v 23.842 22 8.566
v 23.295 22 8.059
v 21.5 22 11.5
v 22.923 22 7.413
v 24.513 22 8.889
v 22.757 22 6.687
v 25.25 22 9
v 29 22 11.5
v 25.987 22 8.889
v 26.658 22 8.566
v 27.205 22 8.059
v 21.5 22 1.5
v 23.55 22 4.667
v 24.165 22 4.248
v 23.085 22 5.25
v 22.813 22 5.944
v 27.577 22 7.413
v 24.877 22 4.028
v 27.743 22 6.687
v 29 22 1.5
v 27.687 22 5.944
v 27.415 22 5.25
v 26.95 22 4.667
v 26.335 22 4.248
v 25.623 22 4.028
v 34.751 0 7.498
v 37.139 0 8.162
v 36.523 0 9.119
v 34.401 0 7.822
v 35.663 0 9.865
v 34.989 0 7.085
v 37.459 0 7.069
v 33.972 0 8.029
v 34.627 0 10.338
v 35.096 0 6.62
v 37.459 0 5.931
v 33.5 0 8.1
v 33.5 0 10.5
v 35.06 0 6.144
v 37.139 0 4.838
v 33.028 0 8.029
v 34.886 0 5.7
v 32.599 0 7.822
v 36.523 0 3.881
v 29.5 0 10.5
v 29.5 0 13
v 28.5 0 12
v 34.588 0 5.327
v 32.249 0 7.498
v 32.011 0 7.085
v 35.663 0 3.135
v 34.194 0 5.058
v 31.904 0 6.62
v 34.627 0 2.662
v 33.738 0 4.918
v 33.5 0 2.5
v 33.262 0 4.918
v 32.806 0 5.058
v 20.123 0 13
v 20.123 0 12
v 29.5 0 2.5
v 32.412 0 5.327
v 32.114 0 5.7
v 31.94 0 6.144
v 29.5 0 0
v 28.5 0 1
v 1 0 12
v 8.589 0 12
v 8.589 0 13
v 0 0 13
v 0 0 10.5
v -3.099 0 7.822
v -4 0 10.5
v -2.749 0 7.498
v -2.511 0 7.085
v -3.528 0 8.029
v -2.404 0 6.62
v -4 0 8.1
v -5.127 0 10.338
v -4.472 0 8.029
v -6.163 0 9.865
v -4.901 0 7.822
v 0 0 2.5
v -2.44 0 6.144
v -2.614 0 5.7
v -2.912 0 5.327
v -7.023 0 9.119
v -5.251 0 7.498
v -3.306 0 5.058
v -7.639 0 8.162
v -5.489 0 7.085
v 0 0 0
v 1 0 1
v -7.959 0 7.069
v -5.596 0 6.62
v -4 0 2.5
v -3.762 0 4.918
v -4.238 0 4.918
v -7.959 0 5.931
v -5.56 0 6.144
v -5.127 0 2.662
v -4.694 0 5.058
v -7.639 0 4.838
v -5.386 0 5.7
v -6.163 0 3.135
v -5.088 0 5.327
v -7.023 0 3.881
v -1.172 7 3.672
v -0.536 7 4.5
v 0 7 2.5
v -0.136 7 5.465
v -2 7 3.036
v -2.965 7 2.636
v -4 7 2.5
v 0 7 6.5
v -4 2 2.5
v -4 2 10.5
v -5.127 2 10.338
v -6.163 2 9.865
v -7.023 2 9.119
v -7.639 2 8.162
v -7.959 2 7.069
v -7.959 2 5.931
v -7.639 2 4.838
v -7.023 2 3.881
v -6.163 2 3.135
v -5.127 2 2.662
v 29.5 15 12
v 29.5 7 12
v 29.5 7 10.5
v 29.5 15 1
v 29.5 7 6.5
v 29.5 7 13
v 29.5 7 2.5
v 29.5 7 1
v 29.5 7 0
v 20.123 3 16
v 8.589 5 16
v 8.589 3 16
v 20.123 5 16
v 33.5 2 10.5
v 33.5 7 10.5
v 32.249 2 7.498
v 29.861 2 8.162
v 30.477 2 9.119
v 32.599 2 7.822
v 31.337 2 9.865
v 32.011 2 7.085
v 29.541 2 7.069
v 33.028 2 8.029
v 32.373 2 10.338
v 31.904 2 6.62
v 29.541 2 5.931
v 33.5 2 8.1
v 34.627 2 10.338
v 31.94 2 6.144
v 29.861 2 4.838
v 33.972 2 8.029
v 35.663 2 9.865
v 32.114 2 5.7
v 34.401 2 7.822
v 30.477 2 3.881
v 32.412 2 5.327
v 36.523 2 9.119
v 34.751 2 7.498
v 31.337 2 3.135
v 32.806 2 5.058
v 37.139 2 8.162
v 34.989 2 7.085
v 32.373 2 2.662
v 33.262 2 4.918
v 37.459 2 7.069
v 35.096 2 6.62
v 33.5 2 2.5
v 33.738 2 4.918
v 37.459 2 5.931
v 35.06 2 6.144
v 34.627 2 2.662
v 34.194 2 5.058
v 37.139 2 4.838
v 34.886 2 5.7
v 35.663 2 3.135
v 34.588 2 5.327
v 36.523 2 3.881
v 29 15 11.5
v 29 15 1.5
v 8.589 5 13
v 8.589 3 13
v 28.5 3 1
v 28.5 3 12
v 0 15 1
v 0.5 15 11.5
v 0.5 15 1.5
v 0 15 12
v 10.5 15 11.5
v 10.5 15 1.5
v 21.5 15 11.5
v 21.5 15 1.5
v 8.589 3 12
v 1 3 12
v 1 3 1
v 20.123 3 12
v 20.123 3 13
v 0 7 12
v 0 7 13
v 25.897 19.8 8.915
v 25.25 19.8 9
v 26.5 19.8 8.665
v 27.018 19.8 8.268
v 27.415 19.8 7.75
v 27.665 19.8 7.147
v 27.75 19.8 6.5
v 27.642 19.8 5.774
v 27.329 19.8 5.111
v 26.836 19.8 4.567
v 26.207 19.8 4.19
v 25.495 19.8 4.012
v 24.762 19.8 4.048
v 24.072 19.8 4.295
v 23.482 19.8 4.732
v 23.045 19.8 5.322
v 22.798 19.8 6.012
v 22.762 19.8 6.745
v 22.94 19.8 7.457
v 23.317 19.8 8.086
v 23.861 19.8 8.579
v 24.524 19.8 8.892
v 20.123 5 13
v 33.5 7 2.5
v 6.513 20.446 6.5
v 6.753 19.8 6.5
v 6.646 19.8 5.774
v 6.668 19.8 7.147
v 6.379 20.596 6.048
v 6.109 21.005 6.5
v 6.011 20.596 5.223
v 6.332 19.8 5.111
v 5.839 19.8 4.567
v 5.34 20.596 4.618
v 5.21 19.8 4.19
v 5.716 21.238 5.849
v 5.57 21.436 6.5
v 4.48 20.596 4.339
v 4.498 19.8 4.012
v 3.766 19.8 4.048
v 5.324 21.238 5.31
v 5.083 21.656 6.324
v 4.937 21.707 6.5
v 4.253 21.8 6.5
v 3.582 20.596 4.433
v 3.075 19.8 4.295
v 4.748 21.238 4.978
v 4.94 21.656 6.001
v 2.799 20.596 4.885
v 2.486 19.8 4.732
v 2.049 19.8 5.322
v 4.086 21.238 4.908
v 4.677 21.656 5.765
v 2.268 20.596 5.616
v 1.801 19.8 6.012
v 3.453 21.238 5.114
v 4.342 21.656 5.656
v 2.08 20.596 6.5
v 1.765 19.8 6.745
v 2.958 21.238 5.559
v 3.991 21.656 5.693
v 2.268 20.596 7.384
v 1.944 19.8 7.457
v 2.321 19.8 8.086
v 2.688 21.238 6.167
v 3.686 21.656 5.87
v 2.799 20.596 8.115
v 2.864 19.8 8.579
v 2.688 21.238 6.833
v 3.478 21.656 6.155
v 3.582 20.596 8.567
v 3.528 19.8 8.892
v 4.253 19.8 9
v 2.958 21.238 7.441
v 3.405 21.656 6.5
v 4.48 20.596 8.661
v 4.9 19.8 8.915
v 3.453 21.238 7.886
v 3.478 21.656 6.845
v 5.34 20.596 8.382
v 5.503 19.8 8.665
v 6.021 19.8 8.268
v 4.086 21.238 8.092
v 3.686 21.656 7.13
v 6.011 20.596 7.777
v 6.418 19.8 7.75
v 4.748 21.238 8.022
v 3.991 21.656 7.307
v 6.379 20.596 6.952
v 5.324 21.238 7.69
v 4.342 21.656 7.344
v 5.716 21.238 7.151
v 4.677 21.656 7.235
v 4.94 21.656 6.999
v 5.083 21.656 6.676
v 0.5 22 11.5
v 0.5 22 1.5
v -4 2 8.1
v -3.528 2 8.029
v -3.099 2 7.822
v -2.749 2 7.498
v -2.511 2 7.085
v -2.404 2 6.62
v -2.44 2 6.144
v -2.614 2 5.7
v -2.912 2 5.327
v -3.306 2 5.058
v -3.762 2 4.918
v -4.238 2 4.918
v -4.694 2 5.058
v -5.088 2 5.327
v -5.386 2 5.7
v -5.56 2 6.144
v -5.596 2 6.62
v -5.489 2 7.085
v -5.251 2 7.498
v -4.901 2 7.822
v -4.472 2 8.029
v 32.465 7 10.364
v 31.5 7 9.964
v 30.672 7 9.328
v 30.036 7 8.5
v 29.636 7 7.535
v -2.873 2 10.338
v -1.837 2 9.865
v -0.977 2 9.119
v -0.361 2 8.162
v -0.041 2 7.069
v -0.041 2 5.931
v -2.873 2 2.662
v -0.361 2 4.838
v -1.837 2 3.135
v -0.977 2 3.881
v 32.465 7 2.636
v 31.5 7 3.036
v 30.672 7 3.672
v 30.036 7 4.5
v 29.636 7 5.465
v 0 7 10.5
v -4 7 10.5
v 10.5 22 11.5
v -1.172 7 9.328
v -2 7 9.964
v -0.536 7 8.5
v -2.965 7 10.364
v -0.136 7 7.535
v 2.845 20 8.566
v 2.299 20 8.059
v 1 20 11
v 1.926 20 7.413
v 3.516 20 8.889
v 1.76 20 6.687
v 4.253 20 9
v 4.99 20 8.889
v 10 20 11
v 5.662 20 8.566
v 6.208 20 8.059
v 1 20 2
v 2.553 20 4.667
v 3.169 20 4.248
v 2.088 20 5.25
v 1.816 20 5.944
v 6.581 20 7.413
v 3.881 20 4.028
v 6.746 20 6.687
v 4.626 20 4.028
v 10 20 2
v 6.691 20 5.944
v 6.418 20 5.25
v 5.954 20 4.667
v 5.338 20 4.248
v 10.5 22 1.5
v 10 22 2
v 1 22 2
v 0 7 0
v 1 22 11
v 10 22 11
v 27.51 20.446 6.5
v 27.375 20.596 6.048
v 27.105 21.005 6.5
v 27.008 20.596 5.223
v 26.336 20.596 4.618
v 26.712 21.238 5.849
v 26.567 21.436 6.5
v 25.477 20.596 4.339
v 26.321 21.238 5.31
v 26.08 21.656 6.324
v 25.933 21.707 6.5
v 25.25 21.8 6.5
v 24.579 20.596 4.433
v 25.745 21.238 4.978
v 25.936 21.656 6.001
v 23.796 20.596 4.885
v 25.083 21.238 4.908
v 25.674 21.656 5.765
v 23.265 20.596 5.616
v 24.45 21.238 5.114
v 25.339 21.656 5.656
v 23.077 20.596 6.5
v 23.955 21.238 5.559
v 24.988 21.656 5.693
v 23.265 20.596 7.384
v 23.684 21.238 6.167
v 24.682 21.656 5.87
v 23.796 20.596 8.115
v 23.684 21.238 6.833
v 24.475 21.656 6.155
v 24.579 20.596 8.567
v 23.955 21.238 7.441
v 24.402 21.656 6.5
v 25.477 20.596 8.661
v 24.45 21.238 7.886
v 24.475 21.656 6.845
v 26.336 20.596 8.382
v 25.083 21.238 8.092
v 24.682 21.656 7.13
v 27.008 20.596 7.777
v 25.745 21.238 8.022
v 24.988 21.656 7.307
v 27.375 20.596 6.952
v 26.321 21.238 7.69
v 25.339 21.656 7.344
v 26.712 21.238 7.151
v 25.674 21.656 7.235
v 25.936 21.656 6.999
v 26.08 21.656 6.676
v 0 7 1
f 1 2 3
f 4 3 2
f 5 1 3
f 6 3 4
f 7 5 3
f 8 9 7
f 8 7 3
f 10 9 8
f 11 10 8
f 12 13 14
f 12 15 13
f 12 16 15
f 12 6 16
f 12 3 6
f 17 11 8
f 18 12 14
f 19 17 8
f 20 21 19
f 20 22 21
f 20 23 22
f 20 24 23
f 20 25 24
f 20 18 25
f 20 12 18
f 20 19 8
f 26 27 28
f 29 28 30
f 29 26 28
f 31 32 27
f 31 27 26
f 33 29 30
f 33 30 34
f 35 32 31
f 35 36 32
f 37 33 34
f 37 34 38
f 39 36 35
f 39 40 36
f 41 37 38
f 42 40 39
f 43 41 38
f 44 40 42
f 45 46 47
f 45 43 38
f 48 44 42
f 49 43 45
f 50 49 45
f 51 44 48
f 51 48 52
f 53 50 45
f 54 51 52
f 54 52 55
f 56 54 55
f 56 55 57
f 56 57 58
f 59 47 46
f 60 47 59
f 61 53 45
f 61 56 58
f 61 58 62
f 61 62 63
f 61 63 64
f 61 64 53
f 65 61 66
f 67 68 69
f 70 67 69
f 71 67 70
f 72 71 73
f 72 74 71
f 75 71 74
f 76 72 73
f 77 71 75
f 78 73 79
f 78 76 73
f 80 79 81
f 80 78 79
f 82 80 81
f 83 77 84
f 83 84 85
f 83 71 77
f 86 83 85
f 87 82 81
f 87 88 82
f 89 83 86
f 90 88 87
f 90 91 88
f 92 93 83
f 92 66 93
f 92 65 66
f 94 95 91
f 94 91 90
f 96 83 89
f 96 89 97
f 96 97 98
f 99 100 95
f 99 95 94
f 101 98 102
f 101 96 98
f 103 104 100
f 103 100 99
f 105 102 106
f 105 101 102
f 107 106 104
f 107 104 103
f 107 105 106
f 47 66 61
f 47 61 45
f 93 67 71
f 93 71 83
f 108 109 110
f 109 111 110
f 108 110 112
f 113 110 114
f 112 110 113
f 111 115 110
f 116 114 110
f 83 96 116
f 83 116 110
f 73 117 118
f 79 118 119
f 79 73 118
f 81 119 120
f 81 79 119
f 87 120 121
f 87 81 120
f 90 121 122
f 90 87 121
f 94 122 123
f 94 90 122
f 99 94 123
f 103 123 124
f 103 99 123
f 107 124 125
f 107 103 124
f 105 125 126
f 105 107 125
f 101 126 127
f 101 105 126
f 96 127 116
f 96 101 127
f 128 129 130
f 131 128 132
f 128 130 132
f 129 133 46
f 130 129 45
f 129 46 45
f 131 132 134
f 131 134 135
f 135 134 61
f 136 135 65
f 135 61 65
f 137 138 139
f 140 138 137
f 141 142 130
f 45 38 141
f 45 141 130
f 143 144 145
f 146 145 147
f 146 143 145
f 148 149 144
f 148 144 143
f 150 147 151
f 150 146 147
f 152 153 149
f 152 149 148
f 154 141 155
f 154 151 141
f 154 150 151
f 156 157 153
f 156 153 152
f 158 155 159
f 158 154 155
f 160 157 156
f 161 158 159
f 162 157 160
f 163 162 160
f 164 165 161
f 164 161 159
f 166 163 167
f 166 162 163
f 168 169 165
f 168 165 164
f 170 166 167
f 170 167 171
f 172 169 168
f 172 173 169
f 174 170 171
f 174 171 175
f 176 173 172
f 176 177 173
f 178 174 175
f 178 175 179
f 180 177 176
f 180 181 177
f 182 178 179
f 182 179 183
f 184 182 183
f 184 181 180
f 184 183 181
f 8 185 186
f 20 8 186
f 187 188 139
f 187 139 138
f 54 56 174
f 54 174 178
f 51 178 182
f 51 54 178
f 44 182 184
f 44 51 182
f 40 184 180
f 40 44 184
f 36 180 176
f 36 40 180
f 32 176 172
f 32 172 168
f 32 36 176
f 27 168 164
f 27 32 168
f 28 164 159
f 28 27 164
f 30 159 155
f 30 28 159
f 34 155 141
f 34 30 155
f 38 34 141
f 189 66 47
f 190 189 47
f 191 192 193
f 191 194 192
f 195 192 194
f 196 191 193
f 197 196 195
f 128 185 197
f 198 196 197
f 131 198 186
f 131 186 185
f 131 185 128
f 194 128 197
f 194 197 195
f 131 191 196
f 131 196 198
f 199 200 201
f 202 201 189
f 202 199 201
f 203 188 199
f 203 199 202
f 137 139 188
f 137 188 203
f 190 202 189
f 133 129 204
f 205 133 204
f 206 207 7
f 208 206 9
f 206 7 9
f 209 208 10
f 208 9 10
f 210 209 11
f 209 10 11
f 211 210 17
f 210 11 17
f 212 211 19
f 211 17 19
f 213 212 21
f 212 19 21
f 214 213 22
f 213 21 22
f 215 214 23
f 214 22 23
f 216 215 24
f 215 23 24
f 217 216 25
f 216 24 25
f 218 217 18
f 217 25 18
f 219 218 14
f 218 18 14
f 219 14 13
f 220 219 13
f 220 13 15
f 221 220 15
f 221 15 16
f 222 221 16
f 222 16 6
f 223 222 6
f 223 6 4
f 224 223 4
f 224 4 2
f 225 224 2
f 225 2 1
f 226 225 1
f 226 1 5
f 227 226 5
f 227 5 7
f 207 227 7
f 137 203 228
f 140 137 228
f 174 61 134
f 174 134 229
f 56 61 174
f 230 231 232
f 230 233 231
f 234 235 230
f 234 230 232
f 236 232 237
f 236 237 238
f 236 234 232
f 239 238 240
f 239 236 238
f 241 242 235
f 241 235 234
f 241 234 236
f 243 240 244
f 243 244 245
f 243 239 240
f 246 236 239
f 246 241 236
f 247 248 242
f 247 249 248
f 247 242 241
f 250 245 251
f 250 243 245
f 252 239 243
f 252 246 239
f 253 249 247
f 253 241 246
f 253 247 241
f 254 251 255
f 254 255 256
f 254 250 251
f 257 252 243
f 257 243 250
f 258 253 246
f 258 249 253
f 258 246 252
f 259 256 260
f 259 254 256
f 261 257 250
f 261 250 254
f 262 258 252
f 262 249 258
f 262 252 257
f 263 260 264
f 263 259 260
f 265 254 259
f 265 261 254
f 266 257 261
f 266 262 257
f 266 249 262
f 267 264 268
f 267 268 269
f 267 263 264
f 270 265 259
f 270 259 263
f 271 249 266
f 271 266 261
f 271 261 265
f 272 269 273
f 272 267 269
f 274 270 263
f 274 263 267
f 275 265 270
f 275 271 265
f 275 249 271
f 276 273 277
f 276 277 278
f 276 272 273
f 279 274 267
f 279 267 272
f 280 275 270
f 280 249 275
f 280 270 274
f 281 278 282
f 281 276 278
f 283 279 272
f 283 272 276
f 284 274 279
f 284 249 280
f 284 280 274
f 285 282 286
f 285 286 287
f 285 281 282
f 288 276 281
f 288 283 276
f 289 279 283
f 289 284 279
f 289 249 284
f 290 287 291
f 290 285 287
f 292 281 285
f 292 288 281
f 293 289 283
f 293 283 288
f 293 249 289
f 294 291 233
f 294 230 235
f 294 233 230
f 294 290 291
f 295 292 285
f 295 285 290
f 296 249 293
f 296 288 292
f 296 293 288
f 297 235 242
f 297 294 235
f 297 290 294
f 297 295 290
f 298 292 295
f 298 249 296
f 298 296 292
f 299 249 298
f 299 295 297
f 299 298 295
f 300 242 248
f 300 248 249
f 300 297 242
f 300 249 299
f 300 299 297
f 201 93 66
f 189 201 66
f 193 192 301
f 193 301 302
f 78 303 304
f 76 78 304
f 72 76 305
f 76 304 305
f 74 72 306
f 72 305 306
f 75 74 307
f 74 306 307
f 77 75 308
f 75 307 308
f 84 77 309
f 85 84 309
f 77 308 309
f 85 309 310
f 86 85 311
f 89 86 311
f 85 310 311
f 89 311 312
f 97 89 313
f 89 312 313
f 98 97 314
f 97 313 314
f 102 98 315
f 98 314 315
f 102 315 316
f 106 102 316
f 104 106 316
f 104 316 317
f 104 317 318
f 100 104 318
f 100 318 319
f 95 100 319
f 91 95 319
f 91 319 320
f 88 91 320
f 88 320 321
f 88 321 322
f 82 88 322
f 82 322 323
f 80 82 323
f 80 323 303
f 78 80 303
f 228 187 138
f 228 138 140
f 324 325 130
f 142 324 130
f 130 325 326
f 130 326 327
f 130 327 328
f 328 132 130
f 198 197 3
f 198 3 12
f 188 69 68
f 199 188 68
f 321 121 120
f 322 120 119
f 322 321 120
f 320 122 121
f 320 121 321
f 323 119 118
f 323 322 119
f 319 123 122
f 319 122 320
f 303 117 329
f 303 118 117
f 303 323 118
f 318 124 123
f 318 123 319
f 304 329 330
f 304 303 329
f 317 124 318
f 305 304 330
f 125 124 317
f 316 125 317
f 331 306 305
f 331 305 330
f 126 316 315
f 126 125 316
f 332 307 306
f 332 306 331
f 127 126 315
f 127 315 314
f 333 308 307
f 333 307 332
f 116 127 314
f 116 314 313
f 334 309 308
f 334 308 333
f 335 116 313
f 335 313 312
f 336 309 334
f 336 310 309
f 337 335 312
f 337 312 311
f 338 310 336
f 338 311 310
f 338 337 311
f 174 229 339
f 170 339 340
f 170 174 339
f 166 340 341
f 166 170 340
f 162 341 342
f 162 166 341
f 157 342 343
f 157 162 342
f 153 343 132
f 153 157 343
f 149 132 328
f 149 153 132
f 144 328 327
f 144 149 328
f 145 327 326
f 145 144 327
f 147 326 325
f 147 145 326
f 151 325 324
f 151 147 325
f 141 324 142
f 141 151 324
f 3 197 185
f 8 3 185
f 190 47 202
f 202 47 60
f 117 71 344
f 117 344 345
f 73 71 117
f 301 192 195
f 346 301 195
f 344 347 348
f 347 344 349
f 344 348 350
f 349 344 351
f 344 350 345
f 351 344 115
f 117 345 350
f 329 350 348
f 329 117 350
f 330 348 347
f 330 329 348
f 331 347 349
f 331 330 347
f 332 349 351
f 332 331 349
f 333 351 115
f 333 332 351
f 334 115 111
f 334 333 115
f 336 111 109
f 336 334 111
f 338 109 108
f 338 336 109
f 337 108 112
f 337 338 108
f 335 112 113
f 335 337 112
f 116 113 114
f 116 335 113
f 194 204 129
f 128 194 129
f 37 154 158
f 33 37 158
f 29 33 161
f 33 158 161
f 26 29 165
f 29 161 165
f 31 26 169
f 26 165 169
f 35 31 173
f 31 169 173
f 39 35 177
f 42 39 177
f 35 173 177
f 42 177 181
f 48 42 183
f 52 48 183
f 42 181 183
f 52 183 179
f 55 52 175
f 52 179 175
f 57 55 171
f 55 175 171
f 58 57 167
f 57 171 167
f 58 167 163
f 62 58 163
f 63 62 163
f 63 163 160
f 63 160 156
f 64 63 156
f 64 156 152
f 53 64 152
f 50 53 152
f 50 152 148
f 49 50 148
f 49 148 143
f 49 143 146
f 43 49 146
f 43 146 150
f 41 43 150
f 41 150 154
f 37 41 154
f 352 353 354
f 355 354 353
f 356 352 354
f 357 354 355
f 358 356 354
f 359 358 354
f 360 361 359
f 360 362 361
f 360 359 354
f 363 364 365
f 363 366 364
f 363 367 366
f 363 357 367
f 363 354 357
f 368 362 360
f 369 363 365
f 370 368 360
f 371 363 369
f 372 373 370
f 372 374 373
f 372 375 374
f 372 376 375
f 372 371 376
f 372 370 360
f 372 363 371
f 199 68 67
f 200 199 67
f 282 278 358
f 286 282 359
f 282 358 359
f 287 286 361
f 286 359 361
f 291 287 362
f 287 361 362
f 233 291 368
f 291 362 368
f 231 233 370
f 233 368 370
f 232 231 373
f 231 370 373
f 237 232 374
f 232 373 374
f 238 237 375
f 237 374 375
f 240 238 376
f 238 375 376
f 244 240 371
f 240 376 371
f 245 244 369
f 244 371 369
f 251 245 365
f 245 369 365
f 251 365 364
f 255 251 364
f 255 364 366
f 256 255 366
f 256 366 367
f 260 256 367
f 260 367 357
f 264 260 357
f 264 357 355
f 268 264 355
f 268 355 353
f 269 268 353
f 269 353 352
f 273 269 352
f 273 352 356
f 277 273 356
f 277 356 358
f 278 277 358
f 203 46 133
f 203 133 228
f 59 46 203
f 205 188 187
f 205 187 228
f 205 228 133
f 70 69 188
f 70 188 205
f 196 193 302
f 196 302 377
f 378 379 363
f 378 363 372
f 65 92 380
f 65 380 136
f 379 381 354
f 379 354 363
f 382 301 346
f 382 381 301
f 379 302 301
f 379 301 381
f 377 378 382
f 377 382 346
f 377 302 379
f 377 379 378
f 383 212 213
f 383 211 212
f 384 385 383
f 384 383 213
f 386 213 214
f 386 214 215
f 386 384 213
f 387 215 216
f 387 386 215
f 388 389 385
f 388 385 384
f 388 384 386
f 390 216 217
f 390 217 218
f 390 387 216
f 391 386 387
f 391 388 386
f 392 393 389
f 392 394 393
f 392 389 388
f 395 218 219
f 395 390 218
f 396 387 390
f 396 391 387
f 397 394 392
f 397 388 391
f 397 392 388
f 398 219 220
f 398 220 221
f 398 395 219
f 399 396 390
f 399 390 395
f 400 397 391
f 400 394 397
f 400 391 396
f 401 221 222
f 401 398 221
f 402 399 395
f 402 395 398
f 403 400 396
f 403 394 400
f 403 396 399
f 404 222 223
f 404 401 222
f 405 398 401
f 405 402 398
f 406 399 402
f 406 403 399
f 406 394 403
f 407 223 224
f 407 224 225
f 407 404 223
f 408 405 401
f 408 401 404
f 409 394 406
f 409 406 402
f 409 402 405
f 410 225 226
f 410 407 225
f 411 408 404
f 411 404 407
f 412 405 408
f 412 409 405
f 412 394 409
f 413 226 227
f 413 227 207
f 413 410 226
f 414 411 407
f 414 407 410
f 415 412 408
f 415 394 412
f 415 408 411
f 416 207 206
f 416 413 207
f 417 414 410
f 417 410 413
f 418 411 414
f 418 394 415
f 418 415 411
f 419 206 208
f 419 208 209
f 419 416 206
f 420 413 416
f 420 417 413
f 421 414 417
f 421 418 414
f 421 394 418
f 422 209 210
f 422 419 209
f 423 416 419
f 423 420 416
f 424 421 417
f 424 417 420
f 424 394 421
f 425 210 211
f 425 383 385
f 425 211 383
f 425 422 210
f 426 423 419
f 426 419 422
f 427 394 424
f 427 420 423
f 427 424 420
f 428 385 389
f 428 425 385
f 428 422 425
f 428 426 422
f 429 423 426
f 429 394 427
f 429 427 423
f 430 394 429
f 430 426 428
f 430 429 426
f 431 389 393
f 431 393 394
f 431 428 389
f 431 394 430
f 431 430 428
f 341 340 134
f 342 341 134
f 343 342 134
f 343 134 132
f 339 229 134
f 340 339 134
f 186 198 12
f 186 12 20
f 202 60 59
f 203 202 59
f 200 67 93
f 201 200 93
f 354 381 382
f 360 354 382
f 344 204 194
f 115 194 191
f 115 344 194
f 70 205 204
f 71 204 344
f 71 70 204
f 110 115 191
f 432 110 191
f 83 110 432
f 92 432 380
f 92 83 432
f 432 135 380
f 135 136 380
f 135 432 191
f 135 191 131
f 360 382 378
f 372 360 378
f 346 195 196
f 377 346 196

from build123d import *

# Parameters (mm, degrees)
EXTRUDE_1_DEPTH     = 7
CUT_EXTRUDE_START   = -5
SKETCH_2_R          = 4
CUT_EXTRUDE_1_DEPTH = 5
SKETCH_3_W          = 29.5
SKETCH_3_H          = 11
EXTRUDE_2_DEPTH     = 8
SKETCH_4_W          = 7.5
SKETCH_4_H          = 10
SKETCH_4_W_2        = 10
EXTRUDE_3_DEPTH     = 7
SKETCH_5_W          = 9
SKETCH_5_H          = 9
CUT_EXTRUDE_2_DEPTH = 2
SKETCH_6_R          = 2.5
CUT_EXTRUDE_3_DEPTH = 2.2
SKETCH_7_R          = 1.6
CUT_EXTRUDE_4_DEPTH = 45.443784717
SKETCH_8_W          = 11.533749137
SKETCH_8_H          = 5
EXTRUDE_4_DEPTH     = 3
CUT_EXTRUDE_5_DEPTH = 3


# Read off the part's stored shape, not the designer's step: 圆顶1, 圆顶2
with BuildPart() as part:
    # 草图1 → 凸台-拉伸1 (new body)
    with BuildSketch(Plane(origin=(0, 0, 0), x_dir=(1, 0, 0), z_dir=(0, 1, 0))):
        with BuildLine():
            Line((0, 0), (29.5, 0))
            Line((29.5, 0), (29.5, -2.5))
            Line((29.5, -2.5), (33.5, -2.5))
            ThreePointArc((33.5, -2.5), (37.5, -6.5), (33.5, -10.5))
            Line((33.5, -10.5), (29.5, -10.5))
            Line((29.5, -10.5), (29.5, -13))
            Line((29.5, -13), (0, -13))
            Line((0, -13), (0, -10.5))
            Line((0, -10.5), (-4, -10.5))
            ThreePointArc((-4, -10.5), (-8, -6.5), (-4, -2.5))
            Line((-4, -2.5), (0, -2.5))
            Line((0, -2.5), (0, 0))
        make_face()
    extrude(amount=EXTRUDE_1_DEPTH)

    # 草图2 → 切除-拉伸1 (cut)
    with BuildSketch(Plane(origin=(0, 7, 0), x_dir=(1, 0, 0), z_dir=(0, 1, 0)).offset(CUT_EXTRUDE_START)):
        with Locations((-4, -6.5)):
            Circle(SKETCH_2_R)
        with Locations((33.5, -6.5)):
            Circle(SKETCH_2_R)
    extrude(amount=CUT_EXTRUDE_1_DEPTH, mode=Mode.SUBTRACT)

    # 草图3 → 凸台-拉伸2 (add)
    with BuildSketch(Plane(origin=(0, 7, 0), x_dir=(1, 0, 0), z_dir=(0, 1, 0))):
        with Locations((14.75, -6.5)):
            Rectangle(SKETCH_3_W, SKETCH_3_H)
    extrude(amount=EXTRUDE_2_DEPTH)

    # 草图4 → 凸台-拉伸3 (add)
    with BuildSketch(Plane(origin=(0, 15, 0), x_dir=(1, 0, 0), z_dir=(0, 1, 0))):
        with Locations((25.25, -6.5)):
            Rectangle(SKETCH_4_W, SKETCH_4_H)
        with Locations((5.5, -6.5)):
            Rectangle(SKETCH_4_W_2, SKETCH_4_H)
    extrude(amount=EXTRUDE_3_DEPTH)

    # 草图5 → 切除-拉伸2 (cut)
    with BuildSketch(Plane(origin=(0, 22, 0), x_dir=(1, 0, 0), z_dir=(0, 1, 0))):
        with Locations((5.5, -6.5)):
            Rectangle(SKETCH_5_W, SKETCH_5_H)
    extrude(amount=-CUT_EXTRUDE_2_DEPTH, mode=Mode.SUBTRACT)

    # 草图6 → 切除-拉伸3 (cut)
    with BuildSketch(Plane(origin=(0, 22, 0), x_dir=(1, 0, 0), z_dir=(0, 1, 0))):
        with Locations(Location((25.25, -6.5, 0), (0, 0, 270))):
            Circle(SKETCH_6_R)
        with Locations(Location((4.253331237, -6.5, 0), (0, 0, 270))):
            Circle(SKETCH_6_R)
    extrude(amount=-CUT_EXTRUDE_3_DEPTH, mode=Mode.SUBTRACT)

    # 圆顶1 outline → 圆顶1 (revolve)
    with BuildSketch(Plane(origin=(4.253331237, 0, 6.5), x_dir=(1, 0, 0), z_dir=(0, 0, 1))):
        with BuildLine():
            Line((0, 19.8), (2.500000001, 19.799999998))
            ThreePointArc((2.500000001, 19.799999998), (1.60078106, 21.238476323), (0, 21.8))
            Line((0, 21.8), (0, 19.8))
        make_face()
    revolve(axis=Axis((4.253331237, 0, 6.5), (0, 1, 0)))

    # 圆顶2 outline → 圆顶2 (revolve)
    with BuildSketch(Plane(origin=(25.25, 0, 6.5), x_dir=(1, 0, 0), z_dir=(0, 0, 1))):
        with BuildLine():
            Line((0, 19.8), (2.500000001, 19.799999997))
            ThreePointArc((2.500000001, 19.799999997), (1.60078106, 21.238476323), (0, 21.8))
            Line((0, 21.8), (0, 19.8))
        make_face()
    revolve(axis=Axis((25.25, 0, 6.5), (0, 1, 0)))

    # 草图7 → 切除-拉伸4 (cut, through all)
    with BuildSketch(Plane(origin=(0, 2, 0), x_dir=(1, 0, 0), z_dir=(0, 1, 0))):
        with Locations(Location((-4, -6.5, 0), (0, 0, 270))):
            Circle(SKETCH_7_R)
        with Locations(Location((33.5, -6.5, 0), (0, 0, 270))):
            Circle(SKETCH_7_R)
    extrude(amount=-CUT_EXTRUDE_4_DEPTH, mode=Mode.SUBTRACT)

    # 草图8 → 凸台-拉伸4 (add)
    with BuildSketch(Plane.XY.offset(13)):
        with Locations((14.355989937, 2.5)):
            Rectangle(SKETCH_8_W, SKETCH_8_H)
    extrude(amount=EXTRUDE_4_DEPTH)

    # 草图10 → 切除-拉伸5 (cut)
    with BuildSketch(Plane.XZ):
        Polygon((8.589115368, 16), (8.589115368, 12), (1, 12), (1, 1), (28.5, 1), (28.5, 12), (20.122864505, 12), (20.122864505, 16), align=None)
    extrude(amount=-CUT_EXTRUDE_5_DEPTH, mode=Mode.SUBTRACT)


solid = part.part
